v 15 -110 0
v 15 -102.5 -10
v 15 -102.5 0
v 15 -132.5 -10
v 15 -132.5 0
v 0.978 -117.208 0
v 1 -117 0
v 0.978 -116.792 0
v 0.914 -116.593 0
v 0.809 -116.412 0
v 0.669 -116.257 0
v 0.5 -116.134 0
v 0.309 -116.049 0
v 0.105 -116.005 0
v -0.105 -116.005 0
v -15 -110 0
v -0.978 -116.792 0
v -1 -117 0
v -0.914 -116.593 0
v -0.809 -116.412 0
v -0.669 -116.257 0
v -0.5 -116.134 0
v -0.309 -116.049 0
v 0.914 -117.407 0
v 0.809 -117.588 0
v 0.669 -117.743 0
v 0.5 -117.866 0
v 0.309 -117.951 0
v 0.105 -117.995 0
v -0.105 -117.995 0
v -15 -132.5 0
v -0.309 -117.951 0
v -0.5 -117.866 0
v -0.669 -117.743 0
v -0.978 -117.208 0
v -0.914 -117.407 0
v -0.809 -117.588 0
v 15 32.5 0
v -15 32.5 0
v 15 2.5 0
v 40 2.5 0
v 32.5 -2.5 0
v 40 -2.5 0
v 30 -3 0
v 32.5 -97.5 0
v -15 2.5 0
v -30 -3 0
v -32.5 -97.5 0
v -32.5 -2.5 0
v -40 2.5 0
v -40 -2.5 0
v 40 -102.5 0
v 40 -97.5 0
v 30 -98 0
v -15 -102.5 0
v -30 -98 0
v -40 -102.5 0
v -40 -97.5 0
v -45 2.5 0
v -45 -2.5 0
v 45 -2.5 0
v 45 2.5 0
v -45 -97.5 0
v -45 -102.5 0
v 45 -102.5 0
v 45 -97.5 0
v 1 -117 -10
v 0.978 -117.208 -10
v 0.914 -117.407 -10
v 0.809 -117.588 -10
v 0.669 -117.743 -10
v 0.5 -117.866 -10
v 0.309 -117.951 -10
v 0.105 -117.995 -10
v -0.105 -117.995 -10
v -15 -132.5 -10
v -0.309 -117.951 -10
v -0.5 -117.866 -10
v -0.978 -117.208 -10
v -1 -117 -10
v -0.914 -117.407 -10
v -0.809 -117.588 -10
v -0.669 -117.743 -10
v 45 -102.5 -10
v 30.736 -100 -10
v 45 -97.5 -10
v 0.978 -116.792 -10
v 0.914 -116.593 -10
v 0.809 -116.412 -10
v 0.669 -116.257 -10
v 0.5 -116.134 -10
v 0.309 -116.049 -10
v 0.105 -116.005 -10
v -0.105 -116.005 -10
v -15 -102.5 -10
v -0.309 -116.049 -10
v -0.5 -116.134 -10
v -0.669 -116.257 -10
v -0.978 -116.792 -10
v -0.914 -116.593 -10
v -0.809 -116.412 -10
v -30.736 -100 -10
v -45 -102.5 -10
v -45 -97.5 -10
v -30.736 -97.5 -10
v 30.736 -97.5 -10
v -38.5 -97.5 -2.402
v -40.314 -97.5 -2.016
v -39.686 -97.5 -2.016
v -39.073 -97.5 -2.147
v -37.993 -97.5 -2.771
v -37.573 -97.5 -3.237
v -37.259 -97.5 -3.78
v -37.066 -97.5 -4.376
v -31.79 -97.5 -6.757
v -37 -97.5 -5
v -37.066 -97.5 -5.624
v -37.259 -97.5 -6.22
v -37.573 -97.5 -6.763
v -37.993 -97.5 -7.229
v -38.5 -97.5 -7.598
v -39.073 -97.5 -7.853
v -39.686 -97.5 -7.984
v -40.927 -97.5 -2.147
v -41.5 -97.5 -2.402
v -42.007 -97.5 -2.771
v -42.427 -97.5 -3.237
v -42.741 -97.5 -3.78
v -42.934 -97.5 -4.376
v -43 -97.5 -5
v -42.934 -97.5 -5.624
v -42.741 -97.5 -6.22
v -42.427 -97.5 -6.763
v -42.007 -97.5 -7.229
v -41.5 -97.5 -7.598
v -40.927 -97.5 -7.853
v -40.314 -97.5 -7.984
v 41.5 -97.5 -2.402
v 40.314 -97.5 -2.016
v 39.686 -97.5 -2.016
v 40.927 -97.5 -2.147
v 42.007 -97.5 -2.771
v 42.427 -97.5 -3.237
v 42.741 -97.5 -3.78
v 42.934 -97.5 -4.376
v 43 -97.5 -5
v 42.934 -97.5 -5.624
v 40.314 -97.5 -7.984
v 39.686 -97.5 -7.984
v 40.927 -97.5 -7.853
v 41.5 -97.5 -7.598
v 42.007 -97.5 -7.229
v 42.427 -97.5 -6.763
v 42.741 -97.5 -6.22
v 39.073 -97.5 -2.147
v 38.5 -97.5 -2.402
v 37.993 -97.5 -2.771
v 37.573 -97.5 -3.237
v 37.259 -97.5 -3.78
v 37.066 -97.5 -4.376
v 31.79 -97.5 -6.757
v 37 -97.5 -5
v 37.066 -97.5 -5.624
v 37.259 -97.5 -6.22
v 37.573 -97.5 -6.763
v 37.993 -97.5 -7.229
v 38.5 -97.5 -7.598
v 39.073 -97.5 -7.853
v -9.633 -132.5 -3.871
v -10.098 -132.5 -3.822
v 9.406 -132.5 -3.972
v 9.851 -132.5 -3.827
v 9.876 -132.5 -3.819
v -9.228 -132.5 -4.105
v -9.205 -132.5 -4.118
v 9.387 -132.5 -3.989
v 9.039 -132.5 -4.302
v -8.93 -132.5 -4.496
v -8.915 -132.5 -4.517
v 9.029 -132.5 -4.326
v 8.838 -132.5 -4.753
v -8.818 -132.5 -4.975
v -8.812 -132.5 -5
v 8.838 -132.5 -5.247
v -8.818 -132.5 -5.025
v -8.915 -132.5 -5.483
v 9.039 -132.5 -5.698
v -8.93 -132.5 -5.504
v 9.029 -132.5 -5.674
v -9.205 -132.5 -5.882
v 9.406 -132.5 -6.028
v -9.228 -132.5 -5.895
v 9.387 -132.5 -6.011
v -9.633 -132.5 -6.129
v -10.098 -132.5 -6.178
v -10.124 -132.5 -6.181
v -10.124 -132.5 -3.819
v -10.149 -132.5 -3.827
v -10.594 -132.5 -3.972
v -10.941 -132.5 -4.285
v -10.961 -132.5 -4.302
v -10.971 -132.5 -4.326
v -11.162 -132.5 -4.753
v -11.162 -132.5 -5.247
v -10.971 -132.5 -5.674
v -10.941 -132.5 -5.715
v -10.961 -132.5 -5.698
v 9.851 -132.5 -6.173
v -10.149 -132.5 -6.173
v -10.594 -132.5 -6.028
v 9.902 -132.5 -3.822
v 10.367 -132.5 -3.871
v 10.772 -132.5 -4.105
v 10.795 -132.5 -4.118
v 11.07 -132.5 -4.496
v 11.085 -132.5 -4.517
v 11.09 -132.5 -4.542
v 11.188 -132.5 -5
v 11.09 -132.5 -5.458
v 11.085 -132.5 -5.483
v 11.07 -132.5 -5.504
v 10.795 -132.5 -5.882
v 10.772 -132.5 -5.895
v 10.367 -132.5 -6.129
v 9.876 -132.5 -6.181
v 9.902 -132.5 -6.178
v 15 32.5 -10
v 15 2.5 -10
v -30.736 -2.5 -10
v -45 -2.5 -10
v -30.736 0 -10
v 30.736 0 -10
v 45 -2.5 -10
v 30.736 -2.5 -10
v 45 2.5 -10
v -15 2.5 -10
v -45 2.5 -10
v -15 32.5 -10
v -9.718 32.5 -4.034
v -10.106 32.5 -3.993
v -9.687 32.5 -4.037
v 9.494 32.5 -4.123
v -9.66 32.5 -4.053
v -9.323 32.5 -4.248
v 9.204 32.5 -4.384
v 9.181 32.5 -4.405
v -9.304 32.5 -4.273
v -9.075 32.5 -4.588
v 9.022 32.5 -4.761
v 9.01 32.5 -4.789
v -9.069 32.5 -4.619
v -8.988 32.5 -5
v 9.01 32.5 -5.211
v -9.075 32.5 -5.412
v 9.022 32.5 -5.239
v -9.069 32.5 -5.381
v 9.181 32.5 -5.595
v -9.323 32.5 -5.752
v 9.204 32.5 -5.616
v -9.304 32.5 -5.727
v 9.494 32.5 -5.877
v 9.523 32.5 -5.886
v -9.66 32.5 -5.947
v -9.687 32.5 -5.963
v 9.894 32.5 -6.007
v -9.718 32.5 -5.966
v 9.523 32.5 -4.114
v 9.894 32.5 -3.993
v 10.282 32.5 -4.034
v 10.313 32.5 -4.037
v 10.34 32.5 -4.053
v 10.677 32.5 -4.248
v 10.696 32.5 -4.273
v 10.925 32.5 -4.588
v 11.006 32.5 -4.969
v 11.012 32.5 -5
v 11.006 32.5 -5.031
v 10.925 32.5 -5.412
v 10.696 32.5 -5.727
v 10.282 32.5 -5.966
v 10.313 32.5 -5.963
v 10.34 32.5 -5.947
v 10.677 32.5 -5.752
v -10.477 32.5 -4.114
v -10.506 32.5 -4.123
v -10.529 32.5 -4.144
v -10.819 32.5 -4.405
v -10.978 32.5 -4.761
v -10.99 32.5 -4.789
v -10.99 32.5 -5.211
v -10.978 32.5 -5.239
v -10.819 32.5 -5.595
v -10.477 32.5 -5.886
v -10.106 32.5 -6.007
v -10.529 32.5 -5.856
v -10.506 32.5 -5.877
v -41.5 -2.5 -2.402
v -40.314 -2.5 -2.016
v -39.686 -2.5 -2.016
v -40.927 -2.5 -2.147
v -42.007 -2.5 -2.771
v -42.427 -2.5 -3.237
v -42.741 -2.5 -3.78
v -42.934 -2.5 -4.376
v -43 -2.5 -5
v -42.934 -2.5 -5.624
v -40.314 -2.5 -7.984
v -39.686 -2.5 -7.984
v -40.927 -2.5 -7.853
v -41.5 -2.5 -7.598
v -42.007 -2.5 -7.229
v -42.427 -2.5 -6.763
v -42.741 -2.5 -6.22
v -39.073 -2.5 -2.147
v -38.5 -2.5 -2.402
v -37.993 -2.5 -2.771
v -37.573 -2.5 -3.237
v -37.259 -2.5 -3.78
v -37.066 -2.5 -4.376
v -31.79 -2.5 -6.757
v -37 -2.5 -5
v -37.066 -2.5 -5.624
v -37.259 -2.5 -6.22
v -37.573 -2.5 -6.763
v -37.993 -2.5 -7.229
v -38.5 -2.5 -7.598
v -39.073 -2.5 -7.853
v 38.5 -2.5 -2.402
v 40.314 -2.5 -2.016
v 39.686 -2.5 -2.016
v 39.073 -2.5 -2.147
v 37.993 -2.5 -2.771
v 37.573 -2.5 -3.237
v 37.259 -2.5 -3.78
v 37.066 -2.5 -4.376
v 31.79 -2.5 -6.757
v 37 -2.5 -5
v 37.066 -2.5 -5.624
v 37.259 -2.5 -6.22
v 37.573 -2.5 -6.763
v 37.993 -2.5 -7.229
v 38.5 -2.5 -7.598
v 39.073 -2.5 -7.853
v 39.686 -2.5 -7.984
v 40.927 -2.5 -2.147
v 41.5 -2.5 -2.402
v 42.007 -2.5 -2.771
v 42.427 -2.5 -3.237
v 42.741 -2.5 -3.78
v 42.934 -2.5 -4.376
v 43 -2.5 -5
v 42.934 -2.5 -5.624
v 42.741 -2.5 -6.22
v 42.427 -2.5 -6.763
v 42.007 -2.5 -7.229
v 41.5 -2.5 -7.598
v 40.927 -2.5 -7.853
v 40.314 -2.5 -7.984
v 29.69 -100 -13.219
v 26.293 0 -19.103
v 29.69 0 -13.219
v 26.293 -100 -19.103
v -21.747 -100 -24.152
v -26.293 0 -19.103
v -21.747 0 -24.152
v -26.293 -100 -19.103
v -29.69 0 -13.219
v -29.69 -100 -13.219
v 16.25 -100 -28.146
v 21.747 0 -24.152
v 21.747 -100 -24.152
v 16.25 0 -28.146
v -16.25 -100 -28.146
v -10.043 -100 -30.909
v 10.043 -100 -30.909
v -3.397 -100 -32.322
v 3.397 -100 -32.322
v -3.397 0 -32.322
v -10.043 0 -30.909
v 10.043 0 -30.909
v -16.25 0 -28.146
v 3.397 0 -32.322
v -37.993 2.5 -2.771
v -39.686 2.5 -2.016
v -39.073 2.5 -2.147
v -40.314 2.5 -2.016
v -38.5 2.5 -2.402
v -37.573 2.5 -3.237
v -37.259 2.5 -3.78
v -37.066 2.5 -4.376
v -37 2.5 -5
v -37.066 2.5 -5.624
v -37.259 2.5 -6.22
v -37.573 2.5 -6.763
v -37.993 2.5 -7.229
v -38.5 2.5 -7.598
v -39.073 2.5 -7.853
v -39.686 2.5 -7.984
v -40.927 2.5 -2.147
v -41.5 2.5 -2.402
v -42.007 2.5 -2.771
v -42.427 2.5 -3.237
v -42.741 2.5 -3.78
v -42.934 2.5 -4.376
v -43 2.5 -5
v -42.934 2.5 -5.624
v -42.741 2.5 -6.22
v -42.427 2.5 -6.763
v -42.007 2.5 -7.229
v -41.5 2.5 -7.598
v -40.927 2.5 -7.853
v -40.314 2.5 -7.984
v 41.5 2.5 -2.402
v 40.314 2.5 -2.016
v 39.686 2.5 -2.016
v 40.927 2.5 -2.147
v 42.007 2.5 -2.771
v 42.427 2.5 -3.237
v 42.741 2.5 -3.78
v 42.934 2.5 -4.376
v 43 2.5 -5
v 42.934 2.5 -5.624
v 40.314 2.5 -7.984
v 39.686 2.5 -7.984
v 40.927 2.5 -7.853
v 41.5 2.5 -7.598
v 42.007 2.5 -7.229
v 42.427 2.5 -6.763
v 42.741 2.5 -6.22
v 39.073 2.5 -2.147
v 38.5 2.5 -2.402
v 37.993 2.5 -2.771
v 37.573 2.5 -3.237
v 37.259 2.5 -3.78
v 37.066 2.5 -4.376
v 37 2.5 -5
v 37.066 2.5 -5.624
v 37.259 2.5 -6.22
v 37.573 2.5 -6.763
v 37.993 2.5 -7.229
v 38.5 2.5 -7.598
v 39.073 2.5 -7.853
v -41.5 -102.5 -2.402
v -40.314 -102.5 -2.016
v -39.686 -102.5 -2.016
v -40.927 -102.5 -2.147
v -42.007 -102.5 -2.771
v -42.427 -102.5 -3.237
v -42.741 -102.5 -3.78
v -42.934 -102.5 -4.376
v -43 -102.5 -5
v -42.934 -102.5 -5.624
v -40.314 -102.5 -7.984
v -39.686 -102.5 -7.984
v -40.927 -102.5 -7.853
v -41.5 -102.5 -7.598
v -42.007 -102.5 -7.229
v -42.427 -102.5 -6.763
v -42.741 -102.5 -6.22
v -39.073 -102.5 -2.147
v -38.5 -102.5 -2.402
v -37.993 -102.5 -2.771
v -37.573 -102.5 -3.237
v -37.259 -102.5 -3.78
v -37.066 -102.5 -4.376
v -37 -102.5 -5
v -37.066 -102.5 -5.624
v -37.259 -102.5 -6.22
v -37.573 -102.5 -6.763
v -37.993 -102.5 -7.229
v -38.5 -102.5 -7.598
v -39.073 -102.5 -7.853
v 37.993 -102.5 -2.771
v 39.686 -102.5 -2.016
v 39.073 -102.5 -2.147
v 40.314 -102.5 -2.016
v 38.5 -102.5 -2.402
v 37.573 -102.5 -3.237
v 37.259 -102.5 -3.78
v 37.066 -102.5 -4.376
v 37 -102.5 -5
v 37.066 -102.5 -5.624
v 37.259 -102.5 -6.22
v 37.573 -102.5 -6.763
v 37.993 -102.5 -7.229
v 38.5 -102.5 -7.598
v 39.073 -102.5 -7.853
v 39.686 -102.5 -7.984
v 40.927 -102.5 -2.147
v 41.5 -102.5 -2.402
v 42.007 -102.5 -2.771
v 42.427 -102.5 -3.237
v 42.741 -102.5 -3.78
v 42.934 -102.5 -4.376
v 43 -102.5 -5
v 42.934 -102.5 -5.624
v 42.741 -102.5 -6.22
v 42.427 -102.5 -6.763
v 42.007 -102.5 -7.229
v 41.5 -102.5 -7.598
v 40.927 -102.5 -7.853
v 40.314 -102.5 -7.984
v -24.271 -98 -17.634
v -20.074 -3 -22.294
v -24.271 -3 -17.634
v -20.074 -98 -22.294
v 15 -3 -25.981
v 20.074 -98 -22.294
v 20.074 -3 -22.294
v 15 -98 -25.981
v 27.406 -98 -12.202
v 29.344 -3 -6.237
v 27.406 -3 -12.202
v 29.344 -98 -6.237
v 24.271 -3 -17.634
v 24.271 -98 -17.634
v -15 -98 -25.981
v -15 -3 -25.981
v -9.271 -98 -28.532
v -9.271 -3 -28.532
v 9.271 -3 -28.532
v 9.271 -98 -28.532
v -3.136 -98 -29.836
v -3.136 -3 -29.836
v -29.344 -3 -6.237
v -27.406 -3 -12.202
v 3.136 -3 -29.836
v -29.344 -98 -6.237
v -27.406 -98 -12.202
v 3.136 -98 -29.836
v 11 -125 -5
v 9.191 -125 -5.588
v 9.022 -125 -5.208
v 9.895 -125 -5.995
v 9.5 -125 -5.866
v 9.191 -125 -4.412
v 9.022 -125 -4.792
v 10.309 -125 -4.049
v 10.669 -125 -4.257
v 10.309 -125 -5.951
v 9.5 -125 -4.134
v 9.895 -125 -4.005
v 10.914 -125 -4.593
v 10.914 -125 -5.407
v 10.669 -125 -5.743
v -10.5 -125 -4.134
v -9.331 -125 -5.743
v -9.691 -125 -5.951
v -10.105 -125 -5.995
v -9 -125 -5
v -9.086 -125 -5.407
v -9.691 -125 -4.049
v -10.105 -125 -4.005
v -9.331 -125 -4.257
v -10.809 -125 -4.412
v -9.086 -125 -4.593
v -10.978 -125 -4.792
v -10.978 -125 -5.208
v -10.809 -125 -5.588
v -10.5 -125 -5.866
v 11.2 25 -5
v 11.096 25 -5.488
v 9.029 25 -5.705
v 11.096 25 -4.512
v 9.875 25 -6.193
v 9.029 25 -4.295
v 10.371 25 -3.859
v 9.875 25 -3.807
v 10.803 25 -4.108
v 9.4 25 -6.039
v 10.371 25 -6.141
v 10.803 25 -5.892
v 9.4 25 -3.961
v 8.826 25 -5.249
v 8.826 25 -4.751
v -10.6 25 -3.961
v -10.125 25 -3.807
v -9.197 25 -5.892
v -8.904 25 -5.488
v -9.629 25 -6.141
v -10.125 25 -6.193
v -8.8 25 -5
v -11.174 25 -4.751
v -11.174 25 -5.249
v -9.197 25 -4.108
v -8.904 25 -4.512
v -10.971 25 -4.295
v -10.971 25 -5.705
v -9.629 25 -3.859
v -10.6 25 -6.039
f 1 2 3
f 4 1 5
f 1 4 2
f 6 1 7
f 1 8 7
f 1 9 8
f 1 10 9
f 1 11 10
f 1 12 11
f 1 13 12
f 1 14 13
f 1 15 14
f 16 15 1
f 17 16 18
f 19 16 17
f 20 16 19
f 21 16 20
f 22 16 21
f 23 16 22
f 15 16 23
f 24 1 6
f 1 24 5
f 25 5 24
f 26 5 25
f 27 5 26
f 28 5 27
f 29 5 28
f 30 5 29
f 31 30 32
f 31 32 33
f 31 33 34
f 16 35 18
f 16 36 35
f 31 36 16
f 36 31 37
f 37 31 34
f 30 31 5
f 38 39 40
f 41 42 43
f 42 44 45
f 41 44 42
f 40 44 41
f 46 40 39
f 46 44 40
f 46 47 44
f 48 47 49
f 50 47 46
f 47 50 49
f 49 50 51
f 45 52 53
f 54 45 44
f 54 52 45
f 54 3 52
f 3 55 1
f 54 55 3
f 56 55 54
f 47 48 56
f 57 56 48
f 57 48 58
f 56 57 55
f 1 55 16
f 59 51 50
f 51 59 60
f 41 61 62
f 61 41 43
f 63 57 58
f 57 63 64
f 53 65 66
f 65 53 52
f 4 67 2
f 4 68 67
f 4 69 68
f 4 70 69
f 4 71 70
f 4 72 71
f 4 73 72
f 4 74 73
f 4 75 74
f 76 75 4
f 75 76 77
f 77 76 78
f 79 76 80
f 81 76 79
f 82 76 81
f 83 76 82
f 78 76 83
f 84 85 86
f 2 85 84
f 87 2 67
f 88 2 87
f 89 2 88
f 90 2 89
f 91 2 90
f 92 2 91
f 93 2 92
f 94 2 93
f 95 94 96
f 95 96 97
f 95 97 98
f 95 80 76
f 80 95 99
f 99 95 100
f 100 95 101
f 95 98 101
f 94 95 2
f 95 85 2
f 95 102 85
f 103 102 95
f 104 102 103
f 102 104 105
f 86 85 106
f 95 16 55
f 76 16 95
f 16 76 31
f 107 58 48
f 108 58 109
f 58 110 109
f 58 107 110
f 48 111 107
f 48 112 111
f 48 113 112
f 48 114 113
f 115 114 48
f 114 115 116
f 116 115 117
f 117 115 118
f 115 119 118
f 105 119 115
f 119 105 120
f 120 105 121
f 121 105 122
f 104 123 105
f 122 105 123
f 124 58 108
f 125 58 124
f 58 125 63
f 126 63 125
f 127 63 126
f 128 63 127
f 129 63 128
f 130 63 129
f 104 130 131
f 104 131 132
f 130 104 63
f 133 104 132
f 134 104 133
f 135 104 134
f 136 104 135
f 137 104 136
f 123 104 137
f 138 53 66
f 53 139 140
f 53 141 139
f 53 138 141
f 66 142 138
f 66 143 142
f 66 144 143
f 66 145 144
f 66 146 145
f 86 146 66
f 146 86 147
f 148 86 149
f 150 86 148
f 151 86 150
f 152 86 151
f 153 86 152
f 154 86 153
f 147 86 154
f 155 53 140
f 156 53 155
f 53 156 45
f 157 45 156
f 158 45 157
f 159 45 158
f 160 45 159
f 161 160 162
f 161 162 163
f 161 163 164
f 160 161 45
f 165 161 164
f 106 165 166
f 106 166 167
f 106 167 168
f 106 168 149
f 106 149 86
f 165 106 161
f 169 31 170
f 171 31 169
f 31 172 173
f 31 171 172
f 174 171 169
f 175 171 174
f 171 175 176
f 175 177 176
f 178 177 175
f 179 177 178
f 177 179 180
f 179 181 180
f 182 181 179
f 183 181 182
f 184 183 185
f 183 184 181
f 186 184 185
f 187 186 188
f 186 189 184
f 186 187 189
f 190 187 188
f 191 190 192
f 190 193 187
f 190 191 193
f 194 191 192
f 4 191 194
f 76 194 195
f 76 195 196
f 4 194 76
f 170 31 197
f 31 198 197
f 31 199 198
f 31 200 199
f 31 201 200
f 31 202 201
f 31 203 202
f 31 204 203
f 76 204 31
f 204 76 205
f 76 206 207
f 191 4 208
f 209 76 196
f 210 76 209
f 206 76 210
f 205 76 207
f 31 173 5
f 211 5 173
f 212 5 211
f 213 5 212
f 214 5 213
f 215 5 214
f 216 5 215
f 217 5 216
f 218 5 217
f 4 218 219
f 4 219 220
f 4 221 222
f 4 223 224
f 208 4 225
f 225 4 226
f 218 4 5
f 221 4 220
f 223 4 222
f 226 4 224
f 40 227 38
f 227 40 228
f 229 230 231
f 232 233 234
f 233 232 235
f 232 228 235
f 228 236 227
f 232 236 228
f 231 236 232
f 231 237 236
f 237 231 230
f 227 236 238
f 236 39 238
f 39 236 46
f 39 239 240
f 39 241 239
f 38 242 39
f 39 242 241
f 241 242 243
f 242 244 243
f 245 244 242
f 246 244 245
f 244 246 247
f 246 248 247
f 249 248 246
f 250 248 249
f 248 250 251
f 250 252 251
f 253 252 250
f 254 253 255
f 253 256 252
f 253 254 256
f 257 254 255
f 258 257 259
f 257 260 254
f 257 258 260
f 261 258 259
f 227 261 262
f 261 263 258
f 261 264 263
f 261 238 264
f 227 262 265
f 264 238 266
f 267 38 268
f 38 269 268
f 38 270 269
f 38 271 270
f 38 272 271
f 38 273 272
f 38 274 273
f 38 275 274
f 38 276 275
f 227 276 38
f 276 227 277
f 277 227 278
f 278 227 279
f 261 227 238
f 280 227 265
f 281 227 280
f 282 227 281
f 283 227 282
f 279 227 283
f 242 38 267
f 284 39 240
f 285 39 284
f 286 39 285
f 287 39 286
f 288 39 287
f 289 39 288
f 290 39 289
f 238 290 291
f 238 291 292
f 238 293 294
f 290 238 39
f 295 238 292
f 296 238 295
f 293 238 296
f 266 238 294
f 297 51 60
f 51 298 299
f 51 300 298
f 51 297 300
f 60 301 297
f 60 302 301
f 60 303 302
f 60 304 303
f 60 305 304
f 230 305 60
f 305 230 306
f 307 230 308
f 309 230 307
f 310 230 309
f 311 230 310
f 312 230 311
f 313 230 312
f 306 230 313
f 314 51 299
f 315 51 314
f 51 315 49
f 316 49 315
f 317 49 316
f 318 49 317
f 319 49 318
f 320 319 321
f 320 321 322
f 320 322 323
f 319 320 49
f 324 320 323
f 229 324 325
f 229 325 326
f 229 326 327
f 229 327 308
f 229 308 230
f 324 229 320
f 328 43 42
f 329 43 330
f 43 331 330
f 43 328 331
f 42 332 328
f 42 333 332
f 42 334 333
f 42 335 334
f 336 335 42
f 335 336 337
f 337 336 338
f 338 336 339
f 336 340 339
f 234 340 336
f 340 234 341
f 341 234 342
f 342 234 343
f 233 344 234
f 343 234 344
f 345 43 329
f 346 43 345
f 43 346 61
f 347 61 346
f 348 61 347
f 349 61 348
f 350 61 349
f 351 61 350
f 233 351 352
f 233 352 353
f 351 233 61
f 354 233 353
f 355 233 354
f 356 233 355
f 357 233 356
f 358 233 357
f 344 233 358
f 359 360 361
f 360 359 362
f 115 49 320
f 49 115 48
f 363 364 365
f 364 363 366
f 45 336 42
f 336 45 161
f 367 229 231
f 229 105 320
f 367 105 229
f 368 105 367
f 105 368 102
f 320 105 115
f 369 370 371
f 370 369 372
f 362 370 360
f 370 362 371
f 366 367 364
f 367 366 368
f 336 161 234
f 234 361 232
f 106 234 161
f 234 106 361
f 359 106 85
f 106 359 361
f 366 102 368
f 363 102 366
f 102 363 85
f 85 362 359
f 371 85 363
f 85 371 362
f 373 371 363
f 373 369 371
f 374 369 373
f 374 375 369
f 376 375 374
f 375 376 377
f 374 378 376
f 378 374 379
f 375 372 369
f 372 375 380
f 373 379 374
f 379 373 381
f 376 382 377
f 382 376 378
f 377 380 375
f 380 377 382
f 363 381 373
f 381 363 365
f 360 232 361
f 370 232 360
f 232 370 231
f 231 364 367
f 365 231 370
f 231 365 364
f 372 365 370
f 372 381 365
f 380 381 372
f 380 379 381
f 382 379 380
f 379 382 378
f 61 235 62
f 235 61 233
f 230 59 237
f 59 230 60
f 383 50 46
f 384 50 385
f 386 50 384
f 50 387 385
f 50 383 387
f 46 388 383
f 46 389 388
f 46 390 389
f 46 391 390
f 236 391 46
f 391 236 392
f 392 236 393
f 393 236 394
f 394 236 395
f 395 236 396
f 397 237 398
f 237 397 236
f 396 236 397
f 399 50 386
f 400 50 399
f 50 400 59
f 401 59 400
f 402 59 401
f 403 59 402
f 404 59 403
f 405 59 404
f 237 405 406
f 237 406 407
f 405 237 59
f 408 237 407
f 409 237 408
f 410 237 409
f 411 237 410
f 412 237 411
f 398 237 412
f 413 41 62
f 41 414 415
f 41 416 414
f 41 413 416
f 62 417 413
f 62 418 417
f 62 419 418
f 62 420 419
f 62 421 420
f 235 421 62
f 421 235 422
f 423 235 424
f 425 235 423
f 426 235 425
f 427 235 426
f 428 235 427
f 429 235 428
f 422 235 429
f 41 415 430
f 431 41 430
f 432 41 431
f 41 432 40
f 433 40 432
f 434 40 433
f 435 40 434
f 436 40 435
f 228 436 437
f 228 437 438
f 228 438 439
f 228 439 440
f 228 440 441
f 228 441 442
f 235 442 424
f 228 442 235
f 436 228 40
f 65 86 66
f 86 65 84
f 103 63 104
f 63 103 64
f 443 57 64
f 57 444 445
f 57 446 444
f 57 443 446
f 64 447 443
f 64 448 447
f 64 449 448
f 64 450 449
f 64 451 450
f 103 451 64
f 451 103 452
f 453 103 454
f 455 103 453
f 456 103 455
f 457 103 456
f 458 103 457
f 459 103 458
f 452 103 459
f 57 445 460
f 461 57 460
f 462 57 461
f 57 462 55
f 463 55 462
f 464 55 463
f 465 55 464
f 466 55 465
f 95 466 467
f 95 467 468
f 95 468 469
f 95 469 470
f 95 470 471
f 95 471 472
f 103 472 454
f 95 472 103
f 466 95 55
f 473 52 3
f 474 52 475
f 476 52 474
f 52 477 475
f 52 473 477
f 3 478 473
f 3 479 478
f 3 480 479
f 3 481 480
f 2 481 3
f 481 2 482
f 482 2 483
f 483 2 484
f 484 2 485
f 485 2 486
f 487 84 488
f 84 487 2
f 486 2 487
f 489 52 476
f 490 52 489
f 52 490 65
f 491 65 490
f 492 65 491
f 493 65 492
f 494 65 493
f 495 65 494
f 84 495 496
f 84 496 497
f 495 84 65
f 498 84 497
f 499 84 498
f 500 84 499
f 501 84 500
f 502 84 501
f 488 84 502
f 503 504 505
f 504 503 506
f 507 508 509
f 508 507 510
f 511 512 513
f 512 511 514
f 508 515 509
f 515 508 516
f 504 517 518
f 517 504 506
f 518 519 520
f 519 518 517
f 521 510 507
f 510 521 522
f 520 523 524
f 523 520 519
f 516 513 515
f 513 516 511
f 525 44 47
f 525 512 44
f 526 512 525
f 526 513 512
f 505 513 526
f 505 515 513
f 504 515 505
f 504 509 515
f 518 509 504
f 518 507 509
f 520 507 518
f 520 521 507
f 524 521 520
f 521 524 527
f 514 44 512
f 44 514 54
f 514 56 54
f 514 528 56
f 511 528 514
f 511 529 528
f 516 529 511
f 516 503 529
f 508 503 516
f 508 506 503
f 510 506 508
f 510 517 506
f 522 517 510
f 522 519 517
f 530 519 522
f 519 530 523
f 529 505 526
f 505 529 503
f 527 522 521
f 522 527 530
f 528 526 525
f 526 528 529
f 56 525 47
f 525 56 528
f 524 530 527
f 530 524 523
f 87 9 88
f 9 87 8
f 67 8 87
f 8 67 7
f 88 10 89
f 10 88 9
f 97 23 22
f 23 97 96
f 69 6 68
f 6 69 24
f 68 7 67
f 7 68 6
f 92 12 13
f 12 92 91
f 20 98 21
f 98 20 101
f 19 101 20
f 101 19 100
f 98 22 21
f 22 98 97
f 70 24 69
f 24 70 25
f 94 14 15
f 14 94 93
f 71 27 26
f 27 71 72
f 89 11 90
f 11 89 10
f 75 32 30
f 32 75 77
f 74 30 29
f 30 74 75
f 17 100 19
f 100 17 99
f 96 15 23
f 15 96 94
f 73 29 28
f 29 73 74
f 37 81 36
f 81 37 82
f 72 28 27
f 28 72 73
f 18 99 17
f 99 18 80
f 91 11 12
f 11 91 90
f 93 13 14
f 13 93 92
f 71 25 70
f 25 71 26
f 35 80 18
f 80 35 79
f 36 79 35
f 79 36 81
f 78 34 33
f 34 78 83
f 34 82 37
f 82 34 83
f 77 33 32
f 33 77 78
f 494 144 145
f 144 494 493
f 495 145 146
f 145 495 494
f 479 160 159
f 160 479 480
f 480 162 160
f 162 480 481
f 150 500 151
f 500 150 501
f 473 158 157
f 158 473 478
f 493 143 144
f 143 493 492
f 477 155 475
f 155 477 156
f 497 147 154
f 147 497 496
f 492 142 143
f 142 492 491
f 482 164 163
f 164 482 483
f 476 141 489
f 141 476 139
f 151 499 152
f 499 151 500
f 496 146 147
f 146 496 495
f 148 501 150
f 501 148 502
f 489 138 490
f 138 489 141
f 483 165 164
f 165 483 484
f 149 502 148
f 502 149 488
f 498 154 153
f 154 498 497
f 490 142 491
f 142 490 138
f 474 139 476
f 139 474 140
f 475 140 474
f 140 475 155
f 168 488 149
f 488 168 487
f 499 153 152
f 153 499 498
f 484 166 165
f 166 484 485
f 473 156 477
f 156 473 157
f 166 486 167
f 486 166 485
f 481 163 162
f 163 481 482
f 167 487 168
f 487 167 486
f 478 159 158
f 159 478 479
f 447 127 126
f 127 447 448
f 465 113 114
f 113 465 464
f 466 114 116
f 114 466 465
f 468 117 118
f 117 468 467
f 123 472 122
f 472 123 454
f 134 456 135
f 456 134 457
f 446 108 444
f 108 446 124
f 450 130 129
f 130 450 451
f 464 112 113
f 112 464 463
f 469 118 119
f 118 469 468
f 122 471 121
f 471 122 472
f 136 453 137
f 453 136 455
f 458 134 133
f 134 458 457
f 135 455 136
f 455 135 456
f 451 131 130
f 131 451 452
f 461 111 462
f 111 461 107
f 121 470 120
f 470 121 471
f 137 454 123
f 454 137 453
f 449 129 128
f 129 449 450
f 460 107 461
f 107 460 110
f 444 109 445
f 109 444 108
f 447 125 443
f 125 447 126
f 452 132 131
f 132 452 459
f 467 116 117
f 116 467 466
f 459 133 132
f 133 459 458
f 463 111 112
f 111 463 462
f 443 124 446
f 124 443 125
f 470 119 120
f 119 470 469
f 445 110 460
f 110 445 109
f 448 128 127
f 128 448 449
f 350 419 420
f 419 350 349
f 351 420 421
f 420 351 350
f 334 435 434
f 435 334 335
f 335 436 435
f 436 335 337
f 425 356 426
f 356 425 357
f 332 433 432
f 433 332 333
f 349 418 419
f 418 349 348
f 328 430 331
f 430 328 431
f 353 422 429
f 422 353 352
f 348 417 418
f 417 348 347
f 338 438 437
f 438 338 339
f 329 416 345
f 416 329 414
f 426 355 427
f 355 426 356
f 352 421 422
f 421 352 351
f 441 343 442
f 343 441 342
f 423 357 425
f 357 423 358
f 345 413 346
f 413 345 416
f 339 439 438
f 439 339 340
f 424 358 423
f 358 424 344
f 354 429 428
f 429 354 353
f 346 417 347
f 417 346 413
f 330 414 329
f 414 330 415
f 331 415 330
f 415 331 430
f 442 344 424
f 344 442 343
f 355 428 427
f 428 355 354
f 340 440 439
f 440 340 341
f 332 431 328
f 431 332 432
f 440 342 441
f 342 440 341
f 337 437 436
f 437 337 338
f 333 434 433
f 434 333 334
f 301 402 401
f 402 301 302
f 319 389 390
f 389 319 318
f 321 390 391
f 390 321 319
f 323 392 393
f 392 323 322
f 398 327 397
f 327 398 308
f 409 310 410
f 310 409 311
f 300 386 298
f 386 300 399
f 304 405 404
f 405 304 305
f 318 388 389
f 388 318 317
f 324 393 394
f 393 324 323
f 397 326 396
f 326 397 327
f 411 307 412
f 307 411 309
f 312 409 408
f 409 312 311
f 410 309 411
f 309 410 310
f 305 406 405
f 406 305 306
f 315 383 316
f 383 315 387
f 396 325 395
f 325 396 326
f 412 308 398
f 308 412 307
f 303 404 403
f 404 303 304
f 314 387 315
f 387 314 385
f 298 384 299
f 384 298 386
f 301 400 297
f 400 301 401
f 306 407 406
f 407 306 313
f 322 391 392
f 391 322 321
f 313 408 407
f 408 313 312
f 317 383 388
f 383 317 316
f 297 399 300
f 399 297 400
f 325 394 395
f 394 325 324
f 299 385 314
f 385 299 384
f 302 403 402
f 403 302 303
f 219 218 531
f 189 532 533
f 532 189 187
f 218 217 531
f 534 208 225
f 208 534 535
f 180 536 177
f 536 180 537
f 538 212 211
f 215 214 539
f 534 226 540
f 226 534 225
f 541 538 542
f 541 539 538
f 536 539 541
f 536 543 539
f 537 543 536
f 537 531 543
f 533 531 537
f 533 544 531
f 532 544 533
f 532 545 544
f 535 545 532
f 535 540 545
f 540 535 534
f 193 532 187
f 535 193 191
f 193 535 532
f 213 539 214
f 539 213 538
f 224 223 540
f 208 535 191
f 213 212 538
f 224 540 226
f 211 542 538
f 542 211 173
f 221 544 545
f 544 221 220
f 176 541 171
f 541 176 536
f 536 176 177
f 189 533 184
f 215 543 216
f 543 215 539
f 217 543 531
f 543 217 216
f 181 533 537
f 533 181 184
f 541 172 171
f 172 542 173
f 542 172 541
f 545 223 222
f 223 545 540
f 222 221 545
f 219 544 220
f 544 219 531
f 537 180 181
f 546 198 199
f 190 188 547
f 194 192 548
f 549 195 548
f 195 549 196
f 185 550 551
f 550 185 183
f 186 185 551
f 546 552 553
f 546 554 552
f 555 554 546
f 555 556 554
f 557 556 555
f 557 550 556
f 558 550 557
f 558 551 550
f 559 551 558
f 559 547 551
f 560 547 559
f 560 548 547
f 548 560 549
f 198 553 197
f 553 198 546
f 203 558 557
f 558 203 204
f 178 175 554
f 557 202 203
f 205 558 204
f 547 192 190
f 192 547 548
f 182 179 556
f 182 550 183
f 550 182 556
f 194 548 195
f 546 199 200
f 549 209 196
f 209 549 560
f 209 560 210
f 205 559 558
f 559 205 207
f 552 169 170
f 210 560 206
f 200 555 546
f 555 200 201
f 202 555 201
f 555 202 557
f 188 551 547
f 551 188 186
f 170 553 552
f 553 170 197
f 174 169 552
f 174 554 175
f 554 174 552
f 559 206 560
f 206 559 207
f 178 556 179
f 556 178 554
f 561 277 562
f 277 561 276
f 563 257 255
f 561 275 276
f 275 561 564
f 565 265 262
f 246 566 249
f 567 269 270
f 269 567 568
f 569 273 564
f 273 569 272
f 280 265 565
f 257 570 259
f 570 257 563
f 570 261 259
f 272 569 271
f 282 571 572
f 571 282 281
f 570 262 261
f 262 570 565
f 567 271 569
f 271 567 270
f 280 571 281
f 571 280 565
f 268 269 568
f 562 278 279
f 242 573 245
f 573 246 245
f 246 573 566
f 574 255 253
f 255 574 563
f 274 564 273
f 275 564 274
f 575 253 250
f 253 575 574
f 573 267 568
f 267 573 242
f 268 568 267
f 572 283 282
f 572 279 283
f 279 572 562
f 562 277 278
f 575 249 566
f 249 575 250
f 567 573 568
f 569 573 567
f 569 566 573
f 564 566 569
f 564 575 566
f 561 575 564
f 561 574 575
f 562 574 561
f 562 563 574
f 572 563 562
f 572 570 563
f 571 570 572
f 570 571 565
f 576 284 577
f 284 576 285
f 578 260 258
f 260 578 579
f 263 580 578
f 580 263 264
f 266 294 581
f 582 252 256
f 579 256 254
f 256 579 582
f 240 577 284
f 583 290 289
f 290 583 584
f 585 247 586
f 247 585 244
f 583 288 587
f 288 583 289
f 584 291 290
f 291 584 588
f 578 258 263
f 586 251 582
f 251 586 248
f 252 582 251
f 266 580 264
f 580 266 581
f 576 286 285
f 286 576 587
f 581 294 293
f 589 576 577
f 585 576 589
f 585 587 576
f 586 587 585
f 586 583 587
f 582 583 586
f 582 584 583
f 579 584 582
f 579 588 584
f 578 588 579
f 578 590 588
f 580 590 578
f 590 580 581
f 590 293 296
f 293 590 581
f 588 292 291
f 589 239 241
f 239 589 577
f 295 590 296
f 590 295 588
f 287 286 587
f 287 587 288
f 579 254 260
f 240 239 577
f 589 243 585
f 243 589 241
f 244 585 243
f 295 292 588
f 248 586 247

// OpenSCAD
difference(){
    union(){
        // kaula
        translate([0,-115,-5]) cube([30,35,10],center=true);
        
        // peppu
        translate([0,15,-5]) cube([30,35,10],center=true);
        
        // vatsa
        rotate([90,0,0])cylinder(h=100, d=65);
        
        //jalkojen kiinnityspätkät
        translate([0,0,-5]) cube([90,5,10],center=true);
        translate([0,-100,-5]) cube([90,5,10],center=true);

    }
    rotate([90,0,0]) translate([0,0,3]) cylinder(h=95, d=60);
    translate([-40,-110,0])cube([80,150,50]);
    
    // kaulan kiinnitysreikä
    translate([0,-117,-20]) cylinder(h=30,d=2,$fn=30);
    
    // jalkojen kiinnitysreiät
    rotate([90,0,0]) translate([40,-5,95]) cylinder(h=10,d=6,$fn=30);
    rotate([90,0,0]) translate([-40,-5,95]) cylinder(h=10,d=6,$fn=30);
    rotate([90,0,0]) translate([40,-5,-5]) cylinder(h=10,d=6,$fn=30);
    rotate([90,0,0]) translate([-40,-5,-5]) cylinder(h=10,d=6,$fn=30);
    
    // kaulan ja pepun ruuviaukot
    rotate([-90,0,0])translate([10,5,-133])cylinder(8,1.2,1,$fn=15);
    rotate([-90,0,0])translate([-10,5,-133])cylinder(8,1.2,1,$fn=15);
    rotate([-90,0,0])translate([10,5,25])cylinder(8,1.2,1,$fn=15);
    rotate([-90,0,0])translate([-10,5,25])cylinder(8,1.2,1,$fn=15);
}
